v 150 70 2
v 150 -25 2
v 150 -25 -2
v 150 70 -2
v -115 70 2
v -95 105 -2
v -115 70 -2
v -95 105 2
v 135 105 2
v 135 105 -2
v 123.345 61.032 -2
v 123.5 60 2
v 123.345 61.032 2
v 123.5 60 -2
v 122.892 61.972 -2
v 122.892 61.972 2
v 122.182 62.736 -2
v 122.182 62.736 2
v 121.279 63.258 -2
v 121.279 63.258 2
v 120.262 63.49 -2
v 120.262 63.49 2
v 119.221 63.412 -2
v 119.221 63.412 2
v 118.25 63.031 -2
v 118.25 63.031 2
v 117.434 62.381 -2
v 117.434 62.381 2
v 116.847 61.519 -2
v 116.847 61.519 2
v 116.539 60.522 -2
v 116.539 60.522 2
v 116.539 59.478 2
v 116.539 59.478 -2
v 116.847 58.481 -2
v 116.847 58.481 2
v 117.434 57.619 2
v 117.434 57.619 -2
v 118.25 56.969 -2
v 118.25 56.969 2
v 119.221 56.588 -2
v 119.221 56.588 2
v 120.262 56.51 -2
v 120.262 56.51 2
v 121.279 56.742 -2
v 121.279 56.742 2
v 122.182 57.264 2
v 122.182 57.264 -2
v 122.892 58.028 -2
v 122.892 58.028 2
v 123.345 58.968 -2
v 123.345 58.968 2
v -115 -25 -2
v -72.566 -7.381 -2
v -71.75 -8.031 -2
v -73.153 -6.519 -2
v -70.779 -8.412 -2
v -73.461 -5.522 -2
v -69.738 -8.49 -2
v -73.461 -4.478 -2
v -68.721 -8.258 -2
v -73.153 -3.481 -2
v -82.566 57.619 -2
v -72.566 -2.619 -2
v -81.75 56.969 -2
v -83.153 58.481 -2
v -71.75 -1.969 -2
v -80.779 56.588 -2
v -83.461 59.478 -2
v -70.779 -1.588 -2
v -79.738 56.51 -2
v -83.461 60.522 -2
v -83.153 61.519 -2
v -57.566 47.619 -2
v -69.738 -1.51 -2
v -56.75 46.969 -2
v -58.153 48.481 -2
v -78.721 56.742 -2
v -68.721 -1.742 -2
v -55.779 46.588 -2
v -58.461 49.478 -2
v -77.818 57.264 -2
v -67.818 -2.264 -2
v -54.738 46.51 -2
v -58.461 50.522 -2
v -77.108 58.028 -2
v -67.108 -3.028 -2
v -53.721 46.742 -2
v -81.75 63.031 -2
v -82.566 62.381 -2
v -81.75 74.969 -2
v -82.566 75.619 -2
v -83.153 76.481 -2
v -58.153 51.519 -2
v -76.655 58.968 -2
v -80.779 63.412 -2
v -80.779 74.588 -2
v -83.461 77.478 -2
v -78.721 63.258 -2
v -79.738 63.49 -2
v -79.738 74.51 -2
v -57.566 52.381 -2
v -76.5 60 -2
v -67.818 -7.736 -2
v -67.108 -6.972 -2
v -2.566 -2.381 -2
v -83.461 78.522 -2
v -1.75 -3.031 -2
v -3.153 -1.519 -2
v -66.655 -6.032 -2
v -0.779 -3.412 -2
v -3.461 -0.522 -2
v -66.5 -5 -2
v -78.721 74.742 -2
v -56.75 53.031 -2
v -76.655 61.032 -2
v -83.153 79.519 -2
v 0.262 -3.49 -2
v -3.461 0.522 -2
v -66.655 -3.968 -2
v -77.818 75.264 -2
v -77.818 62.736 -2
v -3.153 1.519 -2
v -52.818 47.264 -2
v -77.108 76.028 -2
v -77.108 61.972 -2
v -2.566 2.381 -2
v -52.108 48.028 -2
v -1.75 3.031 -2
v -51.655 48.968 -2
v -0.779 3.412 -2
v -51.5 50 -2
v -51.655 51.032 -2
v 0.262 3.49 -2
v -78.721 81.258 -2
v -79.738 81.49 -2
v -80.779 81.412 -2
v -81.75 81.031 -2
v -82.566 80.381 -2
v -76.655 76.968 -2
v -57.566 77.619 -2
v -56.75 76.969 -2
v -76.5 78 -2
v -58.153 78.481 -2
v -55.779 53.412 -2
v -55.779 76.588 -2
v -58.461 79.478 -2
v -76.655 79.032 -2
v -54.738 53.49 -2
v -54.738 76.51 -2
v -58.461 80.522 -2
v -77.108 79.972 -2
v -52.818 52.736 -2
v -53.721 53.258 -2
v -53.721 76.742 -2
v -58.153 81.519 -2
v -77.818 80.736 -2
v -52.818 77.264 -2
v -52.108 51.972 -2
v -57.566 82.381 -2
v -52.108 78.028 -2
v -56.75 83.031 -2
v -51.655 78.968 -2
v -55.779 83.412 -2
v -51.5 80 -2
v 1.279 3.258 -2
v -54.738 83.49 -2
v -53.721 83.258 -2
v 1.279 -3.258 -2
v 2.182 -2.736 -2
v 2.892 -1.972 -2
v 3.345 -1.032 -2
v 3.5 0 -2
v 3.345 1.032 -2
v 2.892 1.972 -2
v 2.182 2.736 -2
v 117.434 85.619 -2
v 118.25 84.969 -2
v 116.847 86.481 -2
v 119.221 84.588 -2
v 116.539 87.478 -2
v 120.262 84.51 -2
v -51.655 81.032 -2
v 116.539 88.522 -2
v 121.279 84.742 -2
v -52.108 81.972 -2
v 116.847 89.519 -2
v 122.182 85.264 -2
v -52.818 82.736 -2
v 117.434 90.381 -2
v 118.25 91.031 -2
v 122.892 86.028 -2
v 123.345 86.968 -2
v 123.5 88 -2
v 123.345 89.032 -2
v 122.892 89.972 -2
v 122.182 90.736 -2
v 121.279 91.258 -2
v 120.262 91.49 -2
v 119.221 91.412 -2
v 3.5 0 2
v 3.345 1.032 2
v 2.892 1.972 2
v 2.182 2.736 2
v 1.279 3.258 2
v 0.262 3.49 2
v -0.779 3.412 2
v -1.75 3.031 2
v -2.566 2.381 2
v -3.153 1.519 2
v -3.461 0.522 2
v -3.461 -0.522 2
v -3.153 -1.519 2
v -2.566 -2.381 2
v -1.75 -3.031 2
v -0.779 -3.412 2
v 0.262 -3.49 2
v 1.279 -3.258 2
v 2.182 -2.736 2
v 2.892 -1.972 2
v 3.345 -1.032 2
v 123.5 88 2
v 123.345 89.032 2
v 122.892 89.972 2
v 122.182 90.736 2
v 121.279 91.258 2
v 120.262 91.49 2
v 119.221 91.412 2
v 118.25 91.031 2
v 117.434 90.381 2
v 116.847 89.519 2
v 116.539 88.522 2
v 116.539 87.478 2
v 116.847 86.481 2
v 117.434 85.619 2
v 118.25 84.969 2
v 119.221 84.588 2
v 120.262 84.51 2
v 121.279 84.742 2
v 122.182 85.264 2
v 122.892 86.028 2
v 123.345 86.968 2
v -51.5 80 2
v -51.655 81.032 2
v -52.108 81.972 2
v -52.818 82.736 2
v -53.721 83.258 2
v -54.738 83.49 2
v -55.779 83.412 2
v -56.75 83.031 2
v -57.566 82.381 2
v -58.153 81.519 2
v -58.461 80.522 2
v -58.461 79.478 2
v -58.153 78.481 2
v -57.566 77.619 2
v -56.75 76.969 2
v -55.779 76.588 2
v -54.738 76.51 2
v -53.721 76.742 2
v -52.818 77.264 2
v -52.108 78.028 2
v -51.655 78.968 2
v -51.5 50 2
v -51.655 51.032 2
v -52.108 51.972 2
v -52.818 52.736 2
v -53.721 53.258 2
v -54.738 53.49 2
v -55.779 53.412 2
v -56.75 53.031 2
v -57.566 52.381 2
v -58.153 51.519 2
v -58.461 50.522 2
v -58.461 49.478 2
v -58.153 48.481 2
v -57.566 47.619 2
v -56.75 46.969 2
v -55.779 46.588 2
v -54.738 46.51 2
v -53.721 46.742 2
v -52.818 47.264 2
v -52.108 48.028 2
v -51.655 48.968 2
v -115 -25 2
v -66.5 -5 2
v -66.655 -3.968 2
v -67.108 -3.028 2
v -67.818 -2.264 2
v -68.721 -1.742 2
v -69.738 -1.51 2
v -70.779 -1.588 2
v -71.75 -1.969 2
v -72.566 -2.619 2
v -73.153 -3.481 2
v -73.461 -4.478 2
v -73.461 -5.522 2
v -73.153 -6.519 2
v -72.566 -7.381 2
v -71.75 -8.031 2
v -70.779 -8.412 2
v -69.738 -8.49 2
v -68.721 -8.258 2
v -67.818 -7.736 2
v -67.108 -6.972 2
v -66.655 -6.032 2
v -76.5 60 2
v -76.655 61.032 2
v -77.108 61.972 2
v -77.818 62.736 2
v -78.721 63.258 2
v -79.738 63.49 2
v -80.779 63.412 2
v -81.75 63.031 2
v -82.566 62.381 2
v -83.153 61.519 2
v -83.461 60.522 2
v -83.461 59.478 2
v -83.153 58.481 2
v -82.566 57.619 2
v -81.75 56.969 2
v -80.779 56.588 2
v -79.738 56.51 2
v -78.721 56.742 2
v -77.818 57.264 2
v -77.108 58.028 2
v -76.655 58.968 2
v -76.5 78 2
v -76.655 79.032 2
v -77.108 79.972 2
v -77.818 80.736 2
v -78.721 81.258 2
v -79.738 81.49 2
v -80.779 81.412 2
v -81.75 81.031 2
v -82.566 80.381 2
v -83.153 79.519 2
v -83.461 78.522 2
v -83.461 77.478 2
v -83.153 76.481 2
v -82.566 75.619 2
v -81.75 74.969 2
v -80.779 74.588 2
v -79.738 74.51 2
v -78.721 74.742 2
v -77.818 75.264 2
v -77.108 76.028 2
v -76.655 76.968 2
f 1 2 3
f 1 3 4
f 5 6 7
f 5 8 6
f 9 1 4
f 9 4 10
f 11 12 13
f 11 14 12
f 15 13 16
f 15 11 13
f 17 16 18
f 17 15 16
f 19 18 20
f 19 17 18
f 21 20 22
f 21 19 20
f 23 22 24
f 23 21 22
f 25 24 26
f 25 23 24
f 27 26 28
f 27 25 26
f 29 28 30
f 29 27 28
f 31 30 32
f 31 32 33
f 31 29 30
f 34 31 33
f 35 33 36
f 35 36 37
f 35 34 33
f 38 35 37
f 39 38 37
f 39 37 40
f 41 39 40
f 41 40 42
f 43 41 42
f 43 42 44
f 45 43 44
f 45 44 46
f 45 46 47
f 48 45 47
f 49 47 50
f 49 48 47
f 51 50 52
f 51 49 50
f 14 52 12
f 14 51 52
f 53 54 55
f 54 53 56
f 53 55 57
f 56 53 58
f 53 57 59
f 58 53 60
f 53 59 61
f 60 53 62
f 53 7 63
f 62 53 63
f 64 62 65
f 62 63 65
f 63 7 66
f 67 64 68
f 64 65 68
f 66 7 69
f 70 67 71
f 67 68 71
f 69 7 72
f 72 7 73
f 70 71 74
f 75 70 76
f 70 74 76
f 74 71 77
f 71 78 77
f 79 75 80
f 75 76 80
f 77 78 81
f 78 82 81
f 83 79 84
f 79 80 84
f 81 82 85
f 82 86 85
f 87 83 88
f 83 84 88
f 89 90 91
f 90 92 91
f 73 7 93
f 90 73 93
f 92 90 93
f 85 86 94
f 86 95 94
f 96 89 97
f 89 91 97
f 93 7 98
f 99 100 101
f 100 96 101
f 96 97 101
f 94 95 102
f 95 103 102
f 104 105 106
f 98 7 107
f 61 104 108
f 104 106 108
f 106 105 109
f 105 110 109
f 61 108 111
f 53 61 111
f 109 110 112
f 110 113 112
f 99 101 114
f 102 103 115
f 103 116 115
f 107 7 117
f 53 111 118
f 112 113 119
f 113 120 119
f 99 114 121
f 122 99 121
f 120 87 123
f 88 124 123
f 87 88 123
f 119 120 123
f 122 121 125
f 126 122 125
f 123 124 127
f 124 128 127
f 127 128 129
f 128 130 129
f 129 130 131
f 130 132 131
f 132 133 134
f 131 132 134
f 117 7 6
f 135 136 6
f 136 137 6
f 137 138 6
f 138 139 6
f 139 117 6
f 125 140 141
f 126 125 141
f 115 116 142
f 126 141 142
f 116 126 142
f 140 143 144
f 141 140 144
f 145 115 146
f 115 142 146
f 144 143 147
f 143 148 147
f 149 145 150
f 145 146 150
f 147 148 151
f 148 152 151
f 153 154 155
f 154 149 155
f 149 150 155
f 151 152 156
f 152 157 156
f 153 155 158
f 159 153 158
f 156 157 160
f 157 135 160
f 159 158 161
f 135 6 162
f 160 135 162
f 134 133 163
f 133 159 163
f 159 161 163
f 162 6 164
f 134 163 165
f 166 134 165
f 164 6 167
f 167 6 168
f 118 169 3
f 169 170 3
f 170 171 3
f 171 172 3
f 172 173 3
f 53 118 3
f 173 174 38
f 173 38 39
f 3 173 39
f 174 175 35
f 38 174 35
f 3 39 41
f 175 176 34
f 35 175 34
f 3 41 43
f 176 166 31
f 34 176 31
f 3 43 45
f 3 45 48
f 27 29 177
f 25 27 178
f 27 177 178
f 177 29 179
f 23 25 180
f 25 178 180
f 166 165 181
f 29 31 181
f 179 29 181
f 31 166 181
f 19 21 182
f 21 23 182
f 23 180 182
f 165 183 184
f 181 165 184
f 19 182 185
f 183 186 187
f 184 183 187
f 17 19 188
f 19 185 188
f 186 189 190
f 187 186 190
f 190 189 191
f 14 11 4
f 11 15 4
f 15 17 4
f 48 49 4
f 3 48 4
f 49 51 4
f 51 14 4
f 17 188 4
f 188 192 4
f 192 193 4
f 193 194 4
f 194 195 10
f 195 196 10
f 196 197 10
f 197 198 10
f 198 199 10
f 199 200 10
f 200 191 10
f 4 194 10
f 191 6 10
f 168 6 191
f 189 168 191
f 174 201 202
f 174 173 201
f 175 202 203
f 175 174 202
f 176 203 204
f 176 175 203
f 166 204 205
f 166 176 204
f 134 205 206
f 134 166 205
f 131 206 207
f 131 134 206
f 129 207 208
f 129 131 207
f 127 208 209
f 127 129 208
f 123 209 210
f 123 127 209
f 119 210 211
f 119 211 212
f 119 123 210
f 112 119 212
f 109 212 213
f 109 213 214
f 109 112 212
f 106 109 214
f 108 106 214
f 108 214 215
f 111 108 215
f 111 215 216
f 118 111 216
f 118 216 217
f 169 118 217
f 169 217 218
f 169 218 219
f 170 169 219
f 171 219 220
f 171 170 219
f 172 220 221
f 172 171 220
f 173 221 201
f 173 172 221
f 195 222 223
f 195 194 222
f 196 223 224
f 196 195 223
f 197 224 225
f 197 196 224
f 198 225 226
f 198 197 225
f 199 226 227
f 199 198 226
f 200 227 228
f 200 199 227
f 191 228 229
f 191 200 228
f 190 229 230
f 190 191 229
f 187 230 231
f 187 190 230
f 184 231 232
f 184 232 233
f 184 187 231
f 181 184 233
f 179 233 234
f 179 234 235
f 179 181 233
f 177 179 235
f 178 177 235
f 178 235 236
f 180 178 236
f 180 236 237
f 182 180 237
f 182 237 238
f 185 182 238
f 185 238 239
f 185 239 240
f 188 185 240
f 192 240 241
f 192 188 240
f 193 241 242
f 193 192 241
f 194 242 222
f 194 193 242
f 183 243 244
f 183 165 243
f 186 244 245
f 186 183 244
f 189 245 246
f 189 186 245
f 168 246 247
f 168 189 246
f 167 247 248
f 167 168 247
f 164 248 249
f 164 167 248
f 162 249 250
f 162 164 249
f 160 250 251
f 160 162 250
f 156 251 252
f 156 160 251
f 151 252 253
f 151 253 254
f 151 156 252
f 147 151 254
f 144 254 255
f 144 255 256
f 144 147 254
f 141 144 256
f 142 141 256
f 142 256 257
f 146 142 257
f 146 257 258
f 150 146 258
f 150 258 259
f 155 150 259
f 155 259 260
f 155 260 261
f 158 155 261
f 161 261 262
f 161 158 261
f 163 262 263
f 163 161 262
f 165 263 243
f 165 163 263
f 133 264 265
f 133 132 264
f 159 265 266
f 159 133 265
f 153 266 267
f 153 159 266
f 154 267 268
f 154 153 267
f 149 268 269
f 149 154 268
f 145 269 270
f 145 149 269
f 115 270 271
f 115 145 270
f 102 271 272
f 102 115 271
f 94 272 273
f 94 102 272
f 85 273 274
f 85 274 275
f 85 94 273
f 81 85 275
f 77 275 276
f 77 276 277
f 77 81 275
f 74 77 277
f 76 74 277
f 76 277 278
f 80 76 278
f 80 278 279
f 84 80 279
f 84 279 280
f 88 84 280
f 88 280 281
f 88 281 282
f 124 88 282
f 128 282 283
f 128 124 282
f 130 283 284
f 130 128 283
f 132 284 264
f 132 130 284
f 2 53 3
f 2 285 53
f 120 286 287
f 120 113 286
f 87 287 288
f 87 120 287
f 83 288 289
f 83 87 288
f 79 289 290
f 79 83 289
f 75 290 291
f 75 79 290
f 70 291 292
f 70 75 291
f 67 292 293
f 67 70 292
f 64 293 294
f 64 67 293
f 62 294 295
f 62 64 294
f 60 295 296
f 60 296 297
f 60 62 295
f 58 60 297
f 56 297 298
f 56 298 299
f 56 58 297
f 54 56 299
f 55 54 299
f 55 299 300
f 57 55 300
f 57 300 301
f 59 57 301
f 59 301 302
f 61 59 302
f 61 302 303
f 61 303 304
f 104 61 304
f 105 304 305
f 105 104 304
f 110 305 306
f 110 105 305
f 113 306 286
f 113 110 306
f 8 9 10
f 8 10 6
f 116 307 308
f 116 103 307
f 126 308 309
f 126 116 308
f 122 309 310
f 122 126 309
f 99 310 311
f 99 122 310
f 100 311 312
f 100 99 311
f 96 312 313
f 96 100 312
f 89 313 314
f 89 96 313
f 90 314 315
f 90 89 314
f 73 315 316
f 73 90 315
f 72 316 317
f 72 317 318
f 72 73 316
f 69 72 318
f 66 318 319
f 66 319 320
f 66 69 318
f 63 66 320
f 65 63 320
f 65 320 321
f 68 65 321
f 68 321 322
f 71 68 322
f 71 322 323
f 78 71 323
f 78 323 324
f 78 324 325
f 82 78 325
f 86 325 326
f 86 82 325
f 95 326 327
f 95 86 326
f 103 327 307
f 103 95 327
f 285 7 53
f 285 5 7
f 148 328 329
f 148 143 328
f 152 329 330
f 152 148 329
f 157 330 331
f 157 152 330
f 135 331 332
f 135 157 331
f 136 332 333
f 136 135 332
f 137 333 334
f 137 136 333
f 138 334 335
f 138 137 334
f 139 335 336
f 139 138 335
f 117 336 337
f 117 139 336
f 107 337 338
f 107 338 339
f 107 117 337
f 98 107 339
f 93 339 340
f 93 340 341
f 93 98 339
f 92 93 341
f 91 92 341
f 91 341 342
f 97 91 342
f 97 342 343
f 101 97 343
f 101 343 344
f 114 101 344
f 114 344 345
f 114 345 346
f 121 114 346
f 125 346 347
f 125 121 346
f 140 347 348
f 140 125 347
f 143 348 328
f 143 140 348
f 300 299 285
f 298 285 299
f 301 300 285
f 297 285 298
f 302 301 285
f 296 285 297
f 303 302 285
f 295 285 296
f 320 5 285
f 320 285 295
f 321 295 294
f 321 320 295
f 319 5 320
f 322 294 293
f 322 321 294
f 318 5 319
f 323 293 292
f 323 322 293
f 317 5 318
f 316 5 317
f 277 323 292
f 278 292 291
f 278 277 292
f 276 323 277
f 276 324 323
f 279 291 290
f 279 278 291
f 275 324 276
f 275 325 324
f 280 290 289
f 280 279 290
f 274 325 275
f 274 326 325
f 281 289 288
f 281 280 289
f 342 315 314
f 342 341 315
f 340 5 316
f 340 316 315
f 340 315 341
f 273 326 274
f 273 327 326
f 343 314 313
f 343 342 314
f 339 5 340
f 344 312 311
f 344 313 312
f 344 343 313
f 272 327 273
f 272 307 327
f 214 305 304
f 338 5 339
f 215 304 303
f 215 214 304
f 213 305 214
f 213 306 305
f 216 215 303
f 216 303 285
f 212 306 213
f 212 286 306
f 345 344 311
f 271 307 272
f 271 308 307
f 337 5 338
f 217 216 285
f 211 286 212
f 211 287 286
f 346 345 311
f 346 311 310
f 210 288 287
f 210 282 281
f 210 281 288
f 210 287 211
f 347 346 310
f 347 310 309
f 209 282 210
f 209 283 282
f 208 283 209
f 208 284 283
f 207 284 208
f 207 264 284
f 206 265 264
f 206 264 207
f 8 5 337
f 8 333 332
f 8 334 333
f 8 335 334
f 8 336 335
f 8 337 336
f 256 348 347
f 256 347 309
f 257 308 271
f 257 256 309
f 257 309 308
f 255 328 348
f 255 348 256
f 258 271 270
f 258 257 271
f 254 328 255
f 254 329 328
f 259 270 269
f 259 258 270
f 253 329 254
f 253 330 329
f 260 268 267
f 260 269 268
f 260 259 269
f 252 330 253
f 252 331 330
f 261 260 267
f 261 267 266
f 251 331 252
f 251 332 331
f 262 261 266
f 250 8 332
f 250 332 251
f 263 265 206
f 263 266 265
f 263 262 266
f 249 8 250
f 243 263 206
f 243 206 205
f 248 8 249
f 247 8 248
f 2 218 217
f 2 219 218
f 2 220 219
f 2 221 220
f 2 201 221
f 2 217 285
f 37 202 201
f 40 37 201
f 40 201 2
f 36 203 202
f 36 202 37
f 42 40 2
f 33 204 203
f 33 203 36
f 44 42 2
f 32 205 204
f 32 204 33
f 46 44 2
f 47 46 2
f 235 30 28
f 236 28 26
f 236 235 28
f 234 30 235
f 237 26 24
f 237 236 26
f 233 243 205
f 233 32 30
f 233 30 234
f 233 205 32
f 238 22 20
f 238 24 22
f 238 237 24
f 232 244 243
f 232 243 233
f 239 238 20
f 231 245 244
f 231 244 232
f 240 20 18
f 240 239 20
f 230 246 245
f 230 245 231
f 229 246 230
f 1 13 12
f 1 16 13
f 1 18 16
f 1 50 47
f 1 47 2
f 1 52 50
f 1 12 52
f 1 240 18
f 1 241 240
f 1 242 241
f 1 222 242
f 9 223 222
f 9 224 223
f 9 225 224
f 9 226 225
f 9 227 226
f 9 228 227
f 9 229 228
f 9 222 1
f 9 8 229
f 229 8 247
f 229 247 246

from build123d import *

# Parameters (mm, degrees)
SKETCH_1_R      = 3.5
EXTRUDE_1_DEPTH = 2


with BuildPart() as part:
    # 草图1 → 凸台-拉伸1 (new, symmetric)
    with BuildSketch(Plane.XY):
        Polygon((-115, -25), (150, -25), (150, 70), (135, 105), (-95, 105), (-115, 70), align=None)
        Circle(SKETCH_1_R, mode=Mode.SUBTRACT)
        with Locations((-80, 60)):
            Circle(SKETCH_1_R, mode=Mode.SUBTRACT)
        with Locations((120, 60)):
            Circle(SKETCH_1_R, mode=Mode.SUBTRACT)
        with Locations((-70, -5)):
            Circle(SKETCH_1_R, mode=Mode.SUBTRACT)
        with Locations((-55, 50)):
            Circle(SKETCH_1_R, mode=Mode.SUBTRACT)
        with Locations((-55, 80)):
            Circle(SKETCH_1_R, mode=Mode.SUBTRACT)
        with Locations((120, 88)):
            Circle(SKETCH_1_R, mode=Mode.SUBTRACT)
        with Locations((-80, 78)):
            Circle(SKETCH_1_R, mode=Mode.SUBTRACT)
    extrude(amount=EXTRUDE_1_DEPTH, both=True)


solid = part.part
